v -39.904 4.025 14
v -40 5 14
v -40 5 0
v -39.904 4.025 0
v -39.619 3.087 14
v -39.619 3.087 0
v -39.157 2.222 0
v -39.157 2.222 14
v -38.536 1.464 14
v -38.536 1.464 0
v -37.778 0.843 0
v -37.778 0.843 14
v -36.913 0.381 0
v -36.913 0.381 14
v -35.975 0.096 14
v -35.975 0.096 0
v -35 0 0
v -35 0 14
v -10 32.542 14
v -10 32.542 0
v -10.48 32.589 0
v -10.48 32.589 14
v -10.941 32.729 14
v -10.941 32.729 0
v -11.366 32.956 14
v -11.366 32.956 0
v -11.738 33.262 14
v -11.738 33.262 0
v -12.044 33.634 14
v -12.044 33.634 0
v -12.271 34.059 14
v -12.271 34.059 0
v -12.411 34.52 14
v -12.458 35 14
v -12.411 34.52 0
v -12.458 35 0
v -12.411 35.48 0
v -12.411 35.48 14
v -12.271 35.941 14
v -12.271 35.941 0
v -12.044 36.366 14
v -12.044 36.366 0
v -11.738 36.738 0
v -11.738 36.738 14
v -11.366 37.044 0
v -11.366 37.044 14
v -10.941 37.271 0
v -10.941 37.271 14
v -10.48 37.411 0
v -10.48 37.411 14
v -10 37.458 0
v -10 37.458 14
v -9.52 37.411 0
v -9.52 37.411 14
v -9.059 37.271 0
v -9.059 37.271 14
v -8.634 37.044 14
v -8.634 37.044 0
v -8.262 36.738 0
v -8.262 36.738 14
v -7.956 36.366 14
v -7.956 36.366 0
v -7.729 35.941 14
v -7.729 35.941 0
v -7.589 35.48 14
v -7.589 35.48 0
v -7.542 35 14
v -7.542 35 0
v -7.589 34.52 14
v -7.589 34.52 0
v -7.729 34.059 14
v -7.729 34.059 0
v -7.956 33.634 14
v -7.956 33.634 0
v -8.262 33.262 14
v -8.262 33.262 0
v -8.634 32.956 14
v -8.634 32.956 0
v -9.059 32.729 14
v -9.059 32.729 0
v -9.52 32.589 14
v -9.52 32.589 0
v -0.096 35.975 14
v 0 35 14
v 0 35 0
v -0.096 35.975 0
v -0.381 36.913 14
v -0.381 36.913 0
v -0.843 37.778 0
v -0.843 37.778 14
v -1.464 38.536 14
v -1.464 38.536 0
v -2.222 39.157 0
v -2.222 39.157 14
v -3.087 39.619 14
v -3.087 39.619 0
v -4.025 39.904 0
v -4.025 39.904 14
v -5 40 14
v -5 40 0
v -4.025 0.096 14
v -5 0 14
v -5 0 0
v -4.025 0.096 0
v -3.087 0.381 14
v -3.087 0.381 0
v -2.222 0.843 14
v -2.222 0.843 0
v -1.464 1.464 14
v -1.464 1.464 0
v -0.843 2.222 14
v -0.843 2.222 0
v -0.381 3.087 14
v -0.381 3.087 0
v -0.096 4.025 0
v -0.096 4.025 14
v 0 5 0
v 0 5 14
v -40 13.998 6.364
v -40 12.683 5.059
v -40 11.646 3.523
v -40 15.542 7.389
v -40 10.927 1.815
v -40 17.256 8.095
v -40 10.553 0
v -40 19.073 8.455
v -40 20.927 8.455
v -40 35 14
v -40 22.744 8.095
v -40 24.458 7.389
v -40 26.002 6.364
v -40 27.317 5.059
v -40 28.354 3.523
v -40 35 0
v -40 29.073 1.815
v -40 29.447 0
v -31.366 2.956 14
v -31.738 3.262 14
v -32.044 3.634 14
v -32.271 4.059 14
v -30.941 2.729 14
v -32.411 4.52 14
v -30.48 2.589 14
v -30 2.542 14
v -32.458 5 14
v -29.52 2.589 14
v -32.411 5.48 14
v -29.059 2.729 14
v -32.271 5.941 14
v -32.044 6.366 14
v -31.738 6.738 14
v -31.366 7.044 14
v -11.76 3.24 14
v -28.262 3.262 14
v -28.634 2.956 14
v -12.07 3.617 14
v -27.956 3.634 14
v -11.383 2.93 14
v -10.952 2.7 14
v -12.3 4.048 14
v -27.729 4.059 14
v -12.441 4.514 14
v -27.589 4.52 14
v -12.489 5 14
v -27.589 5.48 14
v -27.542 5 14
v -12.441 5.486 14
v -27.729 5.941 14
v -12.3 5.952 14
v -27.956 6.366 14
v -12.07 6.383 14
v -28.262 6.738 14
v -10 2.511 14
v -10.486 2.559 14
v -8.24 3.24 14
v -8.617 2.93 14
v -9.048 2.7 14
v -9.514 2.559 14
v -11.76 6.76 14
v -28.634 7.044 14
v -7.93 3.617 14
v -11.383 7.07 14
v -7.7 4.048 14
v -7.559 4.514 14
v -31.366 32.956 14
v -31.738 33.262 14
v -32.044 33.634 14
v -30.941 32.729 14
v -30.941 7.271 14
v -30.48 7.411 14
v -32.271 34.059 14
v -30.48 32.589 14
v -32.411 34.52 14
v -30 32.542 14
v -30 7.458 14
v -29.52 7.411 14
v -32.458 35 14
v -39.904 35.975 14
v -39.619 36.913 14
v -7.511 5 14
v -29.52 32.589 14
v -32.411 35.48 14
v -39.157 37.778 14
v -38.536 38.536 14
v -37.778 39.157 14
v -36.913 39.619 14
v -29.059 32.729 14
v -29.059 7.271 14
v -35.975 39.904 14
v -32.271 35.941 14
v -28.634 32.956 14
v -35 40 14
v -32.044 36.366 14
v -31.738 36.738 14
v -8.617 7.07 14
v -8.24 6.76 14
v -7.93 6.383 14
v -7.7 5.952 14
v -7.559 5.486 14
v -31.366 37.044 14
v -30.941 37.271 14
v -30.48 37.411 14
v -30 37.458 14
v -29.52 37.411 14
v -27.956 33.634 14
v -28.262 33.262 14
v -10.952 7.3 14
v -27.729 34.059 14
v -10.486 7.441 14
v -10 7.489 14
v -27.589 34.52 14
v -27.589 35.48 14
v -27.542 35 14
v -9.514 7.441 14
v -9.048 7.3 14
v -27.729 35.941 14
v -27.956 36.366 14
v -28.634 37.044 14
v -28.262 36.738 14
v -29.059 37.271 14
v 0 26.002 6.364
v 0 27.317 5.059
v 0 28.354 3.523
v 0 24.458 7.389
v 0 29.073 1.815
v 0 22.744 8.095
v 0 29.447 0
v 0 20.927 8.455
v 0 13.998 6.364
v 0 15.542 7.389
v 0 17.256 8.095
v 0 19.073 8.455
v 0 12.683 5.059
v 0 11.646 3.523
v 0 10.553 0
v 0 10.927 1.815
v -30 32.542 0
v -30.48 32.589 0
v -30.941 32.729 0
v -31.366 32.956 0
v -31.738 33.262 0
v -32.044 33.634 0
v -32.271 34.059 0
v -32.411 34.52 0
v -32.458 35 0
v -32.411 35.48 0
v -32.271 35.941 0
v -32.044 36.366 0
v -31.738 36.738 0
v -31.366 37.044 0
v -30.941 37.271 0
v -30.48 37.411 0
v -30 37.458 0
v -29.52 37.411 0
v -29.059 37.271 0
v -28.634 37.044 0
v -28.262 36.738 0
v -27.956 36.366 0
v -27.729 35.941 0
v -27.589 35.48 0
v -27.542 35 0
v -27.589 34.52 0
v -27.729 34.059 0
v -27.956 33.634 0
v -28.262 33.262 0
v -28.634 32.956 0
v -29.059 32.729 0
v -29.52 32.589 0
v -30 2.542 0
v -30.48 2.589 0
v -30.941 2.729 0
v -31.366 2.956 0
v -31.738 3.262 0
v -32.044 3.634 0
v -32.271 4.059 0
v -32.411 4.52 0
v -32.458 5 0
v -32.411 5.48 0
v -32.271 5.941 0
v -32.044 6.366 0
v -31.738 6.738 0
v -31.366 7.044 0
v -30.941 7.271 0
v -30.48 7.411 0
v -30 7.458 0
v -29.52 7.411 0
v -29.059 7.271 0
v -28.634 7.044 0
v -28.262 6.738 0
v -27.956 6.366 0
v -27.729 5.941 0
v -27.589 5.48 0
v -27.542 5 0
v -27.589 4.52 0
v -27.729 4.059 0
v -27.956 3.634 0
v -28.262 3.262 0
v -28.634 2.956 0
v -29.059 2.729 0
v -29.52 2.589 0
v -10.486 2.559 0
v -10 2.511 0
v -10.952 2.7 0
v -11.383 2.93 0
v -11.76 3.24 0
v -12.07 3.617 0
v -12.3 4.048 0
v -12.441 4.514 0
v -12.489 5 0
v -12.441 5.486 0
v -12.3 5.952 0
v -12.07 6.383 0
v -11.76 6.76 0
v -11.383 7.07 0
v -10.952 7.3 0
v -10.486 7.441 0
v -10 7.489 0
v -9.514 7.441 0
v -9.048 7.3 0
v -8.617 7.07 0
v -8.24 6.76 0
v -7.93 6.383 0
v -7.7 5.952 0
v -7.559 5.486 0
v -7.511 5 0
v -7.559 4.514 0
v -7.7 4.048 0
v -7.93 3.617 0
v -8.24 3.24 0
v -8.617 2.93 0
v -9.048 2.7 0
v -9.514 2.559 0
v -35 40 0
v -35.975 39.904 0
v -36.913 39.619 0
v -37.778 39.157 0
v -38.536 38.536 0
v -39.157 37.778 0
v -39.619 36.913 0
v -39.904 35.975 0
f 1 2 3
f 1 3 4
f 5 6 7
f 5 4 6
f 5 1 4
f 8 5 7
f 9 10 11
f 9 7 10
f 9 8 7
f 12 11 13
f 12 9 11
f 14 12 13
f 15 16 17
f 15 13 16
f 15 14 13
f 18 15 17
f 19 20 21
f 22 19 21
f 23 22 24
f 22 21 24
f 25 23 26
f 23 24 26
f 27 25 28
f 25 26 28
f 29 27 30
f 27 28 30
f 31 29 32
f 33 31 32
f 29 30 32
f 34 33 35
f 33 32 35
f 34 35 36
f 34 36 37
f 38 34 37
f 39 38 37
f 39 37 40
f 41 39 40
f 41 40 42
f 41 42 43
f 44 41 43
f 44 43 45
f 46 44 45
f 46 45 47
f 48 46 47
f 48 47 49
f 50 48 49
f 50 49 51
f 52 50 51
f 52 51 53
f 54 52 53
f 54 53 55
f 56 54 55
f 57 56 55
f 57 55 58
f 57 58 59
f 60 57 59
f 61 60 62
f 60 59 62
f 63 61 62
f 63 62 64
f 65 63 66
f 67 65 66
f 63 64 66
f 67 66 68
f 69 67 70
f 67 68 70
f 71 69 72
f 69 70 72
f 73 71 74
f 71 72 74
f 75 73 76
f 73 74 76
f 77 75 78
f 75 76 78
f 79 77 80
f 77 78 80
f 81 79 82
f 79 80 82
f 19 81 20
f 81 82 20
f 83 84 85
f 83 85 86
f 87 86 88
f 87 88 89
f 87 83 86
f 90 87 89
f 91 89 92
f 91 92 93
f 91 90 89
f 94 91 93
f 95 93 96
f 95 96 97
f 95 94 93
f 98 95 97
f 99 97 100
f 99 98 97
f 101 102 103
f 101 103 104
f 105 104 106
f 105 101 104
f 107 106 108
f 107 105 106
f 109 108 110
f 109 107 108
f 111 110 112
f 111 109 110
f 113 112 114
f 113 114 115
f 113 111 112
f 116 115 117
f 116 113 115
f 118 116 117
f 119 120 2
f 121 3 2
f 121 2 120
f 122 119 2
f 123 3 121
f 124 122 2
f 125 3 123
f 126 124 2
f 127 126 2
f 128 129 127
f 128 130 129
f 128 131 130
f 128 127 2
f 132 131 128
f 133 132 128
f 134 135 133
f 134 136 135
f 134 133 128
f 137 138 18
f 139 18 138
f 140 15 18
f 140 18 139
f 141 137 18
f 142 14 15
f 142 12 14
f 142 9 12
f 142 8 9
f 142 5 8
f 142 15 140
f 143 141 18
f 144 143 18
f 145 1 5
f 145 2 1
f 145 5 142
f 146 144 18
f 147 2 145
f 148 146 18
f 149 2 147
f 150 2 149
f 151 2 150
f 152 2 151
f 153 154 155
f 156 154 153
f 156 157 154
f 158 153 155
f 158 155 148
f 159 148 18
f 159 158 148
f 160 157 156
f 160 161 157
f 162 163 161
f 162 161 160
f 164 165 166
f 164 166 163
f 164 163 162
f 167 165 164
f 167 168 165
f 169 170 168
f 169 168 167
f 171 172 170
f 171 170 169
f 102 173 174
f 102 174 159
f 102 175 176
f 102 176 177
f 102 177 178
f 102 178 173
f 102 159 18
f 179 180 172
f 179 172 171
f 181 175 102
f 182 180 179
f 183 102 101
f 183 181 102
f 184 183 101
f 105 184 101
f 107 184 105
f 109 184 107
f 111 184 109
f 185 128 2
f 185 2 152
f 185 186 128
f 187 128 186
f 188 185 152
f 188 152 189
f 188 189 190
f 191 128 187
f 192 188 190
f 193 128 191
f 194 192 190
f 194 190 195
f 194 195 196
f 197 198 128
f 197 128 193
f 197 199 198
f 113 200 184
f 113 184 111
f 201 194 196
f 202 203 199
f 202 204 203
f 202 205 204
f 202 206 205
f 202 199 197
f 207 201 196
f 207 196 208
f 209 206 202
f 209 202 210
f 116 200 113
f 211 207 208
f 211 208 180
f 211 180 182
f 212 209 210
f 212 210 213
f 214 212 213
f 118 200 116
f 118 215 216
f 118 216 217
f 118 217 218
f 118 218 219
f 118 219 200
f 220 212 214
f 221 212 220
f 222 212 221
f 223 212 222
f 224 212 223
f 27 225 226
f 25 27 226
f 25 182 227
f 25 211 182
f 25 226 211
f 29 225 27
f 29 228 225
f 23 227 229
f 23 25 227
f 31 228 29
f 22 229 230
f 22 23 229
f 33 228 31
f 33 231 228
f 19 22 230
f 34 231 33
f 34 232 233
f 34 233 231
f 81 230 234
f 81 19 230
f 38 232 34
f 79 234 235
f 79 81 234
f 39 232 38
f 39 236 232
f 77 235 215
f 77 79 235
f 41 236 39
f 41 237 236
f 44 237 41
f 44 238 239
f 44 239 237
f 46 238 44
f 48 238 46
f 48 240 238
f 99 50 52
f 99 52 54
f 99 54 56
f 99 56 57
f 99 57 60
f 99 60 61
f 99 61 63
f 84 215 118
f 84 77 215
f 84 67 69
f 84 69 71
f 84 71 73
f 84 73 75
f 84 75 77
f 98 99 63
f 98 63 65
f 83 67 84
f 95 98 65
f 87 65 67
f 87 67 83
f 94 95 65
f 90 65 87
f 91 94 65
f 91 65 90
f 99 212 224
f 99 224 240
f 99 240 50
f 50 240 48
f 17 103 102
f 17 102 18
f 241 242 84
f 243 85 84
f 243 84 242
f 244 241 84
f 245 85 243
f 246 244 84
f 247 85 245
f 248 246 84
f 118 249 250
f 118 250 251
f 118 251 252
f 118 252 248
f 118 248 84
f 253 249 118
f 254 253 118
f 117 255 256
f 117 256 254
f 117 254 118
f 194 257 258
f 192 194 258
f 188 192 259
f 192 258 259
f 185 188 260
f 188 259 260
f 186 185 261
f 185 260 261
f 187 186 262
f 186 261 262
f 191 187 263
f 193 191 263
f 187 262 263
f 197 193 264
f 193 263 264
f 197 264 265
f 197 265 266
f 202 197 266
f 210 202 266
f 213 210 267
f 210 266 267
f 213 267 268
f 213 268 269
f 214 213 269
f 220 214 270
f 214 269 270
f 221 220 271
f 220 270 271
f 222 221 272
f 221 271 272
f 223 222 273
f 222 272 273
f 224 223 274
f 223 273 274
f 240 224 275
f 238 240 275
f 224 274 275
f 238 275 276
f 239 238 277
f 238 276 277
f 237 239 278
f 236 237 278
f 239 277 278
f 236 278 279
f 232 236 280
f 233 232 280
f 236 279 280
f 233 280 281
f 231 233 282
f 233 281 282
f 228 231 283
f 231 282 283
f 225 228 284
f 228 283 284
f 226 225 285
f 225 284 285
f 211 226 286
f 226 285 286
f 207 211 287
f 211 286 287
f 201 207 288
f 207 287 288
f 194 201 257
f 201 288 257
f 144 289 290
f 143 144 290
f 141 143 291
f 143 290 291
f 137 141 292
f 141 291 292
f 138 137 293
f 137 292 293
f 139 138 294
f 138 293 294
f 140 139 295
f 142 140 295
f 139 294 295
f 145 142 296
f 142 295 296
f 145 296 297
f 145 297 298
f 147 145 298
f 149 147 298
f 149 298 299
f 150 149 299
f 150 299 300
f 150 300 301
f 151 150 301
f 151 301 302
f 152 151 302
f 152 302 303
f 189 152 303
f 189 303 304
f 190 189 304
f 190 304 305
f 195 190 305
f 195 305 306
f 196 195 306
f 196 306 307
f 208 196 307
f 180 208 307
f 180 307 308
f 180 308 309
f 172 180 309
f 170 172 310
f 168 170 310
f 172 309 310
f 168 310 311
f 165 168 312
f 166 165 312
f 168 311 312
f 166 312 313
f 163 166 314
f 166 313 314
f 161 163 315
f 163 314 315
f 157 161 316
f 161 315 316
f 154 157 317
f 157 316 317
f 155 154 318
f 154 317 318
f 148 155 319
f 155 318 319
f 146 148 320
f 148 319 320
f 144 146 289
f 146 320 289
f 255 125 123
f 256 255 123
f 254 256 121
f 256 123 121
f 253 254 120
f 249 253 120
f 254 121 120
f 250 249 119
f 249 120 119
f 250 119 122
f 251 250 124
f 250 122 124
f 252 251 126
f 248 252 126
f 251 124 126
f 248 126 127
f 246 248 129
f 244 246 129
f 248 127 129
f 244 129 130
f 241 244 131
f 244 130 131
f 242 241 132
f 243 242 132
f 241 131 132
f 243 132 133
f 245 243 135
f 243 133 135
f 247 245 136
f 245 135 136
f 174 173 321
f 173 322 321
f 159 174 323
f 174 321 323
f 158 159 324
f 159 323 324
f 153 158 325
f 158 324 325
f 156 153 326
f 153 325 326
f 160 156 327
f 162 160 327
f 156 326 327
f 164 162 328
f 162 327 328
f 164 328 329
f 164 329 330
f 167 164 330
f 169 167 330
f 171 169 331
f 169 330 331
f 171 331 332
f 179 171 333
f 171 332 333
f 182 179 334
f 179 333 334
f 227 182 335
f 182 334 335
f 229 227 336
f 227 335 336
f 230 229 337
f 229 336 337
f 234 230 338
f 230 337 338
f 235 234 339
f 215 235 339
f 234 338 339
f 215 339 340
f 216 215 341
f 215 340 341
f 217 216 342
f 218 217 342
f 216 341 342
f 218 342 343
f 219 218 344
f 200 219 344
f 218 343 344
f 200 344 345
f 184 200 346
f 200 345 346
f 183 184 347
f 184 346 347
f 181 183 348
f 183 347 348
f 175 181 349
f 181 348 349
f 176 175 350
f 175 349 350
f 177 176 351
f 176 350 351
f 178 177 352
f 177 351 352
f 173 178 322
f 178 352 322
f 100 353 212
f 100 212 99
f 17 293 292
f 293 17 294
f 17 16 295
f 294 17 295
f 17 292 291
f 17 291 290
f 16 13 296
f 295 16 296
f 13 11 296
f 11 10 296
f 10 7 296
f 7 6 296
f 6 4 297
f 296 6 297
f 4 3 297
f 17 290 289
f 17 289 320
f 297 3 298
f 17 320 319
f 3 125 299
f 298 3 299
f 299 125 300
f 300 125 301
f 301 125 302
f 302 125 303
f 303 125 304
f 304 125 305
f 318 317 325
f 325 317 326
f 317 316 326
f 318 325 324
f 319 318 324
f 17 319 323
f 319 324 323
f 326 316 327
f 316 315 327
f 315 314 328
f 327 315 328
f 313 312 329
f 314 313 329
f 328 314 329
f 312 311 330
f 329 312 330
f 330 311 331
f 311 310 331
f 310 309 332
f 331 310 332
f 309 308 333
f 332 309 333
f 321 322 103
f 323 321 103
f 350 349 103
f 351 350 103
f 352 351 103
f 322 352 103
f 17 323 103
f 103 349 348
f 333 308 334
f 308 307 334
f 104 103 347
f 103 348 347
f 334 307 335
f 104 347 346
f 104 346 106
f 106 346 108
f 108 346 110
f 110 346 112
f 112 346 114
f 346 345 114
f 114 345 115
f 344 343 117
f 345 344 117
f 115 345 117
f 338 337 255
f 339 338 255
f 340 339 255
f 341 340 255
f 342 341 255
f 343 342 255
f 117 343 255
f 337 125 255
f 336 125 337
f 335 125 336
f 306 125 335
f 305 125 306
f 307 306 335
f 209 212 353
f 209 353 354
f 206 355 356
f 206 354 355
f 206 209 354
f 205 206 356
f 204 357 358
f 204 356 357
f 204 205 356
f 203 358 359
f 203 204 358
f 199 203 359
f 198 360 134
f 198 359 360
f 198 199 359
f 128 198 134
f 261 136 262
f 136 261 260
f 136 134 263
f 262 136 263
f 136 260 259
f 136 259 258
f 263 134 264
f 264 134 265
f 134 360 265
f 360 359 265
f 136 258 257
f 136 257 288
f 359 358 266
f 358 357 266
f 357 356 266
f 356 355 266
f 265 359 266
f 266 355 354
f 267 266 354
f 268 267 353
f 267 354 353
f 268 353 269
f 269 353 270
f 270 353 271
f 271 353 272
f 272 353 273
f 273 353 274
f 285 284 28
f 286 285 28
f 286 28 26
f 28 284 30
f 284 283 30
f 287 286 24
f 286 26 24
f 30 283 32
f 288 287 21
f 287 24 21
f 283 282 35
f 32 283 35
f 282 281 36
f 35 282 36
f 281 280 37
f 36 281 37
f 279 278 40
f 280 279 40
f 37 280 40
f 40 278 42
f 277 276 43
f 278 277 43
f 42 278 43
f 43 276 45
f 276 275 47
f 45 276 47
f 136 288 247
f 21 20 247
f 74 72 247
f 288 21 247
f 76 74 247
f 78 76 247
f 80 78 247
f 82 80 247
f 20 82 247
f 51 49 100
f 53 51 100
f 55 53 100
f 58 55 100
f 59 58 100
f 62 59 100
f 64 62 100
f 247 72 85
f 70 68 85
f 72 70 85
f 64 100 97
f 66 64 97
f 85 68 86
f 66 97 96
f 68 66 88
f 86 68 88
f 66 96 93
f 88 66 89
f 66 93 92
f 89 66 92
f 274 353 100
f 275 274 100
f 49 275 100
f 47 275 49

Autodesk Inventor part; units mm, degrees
ref_plane "YZ Plane" through (0, 0, 0) normal (1, 0, 0) x (0, 1, 0)
ref_plane "XZ Plane" through (0, 0, 0) normal (0, 1, 0) x (-1, 0, 0)
ref_plane "XY Plane" through (0, 0, 0) normal (0, 0, 1) x (1, 0, 0)
sketch "Sketch4" plane through (0, 0, 0) normal (0, 0, 1) x (1, 0, 0)
  line L0 (0, 0) -> (-40, 0)
  line L1 (-40, 0) -> (-40, 40)
  line L2 (-40, 40) -> (0, 40)
  line L3 (0, 40) -> (0, 0)
  dimension "d37" = 40
  dimension "d38" = 40
extrude "Extrusion2" add sketch "Sketch4" along normal blind 14
hole "Hole3" at (-30, 35, 14) direction (0, 0, -1) diameter 4.917 depth 17.1 tip angle 118 thread size "M6x1" class "6H" standard "ISO Metric profile"
hole "Hole4" at (-10, 35, 14) direction (0, 0, -1) diameter 4.917 depth 17.1 tip angle 118 thread size "M6x1" class "6H" standard "ANSI Metric M Profile"
hole "Hole5" at (-10, 5, 14) direction (0, 0, -1) diameter 4.978 depth 19.05 tip angle 118 thread size "1/4-20 UNC" class "2B" standard "ANSI Unified Screw Threads"
hole "Hole6" at (-30, 5, 14) direction (0, 0, -1) diameter 4.917 depth 17.1 tip angle 118 thread size "M6x1" class "6H" standard "ANSI Metric M Profile"
hole "Hole7" at (0, 20, -1) direction (-1, 0, 0) diameter 19 end through all
fillet "Fillet1" radius 5 4 edges at (-40, 40, 7) (0, 40, 7) (0, 0, 7) (-40, 0, 7)
properties part number "GARFO" material "Aluminium AW-7020"
